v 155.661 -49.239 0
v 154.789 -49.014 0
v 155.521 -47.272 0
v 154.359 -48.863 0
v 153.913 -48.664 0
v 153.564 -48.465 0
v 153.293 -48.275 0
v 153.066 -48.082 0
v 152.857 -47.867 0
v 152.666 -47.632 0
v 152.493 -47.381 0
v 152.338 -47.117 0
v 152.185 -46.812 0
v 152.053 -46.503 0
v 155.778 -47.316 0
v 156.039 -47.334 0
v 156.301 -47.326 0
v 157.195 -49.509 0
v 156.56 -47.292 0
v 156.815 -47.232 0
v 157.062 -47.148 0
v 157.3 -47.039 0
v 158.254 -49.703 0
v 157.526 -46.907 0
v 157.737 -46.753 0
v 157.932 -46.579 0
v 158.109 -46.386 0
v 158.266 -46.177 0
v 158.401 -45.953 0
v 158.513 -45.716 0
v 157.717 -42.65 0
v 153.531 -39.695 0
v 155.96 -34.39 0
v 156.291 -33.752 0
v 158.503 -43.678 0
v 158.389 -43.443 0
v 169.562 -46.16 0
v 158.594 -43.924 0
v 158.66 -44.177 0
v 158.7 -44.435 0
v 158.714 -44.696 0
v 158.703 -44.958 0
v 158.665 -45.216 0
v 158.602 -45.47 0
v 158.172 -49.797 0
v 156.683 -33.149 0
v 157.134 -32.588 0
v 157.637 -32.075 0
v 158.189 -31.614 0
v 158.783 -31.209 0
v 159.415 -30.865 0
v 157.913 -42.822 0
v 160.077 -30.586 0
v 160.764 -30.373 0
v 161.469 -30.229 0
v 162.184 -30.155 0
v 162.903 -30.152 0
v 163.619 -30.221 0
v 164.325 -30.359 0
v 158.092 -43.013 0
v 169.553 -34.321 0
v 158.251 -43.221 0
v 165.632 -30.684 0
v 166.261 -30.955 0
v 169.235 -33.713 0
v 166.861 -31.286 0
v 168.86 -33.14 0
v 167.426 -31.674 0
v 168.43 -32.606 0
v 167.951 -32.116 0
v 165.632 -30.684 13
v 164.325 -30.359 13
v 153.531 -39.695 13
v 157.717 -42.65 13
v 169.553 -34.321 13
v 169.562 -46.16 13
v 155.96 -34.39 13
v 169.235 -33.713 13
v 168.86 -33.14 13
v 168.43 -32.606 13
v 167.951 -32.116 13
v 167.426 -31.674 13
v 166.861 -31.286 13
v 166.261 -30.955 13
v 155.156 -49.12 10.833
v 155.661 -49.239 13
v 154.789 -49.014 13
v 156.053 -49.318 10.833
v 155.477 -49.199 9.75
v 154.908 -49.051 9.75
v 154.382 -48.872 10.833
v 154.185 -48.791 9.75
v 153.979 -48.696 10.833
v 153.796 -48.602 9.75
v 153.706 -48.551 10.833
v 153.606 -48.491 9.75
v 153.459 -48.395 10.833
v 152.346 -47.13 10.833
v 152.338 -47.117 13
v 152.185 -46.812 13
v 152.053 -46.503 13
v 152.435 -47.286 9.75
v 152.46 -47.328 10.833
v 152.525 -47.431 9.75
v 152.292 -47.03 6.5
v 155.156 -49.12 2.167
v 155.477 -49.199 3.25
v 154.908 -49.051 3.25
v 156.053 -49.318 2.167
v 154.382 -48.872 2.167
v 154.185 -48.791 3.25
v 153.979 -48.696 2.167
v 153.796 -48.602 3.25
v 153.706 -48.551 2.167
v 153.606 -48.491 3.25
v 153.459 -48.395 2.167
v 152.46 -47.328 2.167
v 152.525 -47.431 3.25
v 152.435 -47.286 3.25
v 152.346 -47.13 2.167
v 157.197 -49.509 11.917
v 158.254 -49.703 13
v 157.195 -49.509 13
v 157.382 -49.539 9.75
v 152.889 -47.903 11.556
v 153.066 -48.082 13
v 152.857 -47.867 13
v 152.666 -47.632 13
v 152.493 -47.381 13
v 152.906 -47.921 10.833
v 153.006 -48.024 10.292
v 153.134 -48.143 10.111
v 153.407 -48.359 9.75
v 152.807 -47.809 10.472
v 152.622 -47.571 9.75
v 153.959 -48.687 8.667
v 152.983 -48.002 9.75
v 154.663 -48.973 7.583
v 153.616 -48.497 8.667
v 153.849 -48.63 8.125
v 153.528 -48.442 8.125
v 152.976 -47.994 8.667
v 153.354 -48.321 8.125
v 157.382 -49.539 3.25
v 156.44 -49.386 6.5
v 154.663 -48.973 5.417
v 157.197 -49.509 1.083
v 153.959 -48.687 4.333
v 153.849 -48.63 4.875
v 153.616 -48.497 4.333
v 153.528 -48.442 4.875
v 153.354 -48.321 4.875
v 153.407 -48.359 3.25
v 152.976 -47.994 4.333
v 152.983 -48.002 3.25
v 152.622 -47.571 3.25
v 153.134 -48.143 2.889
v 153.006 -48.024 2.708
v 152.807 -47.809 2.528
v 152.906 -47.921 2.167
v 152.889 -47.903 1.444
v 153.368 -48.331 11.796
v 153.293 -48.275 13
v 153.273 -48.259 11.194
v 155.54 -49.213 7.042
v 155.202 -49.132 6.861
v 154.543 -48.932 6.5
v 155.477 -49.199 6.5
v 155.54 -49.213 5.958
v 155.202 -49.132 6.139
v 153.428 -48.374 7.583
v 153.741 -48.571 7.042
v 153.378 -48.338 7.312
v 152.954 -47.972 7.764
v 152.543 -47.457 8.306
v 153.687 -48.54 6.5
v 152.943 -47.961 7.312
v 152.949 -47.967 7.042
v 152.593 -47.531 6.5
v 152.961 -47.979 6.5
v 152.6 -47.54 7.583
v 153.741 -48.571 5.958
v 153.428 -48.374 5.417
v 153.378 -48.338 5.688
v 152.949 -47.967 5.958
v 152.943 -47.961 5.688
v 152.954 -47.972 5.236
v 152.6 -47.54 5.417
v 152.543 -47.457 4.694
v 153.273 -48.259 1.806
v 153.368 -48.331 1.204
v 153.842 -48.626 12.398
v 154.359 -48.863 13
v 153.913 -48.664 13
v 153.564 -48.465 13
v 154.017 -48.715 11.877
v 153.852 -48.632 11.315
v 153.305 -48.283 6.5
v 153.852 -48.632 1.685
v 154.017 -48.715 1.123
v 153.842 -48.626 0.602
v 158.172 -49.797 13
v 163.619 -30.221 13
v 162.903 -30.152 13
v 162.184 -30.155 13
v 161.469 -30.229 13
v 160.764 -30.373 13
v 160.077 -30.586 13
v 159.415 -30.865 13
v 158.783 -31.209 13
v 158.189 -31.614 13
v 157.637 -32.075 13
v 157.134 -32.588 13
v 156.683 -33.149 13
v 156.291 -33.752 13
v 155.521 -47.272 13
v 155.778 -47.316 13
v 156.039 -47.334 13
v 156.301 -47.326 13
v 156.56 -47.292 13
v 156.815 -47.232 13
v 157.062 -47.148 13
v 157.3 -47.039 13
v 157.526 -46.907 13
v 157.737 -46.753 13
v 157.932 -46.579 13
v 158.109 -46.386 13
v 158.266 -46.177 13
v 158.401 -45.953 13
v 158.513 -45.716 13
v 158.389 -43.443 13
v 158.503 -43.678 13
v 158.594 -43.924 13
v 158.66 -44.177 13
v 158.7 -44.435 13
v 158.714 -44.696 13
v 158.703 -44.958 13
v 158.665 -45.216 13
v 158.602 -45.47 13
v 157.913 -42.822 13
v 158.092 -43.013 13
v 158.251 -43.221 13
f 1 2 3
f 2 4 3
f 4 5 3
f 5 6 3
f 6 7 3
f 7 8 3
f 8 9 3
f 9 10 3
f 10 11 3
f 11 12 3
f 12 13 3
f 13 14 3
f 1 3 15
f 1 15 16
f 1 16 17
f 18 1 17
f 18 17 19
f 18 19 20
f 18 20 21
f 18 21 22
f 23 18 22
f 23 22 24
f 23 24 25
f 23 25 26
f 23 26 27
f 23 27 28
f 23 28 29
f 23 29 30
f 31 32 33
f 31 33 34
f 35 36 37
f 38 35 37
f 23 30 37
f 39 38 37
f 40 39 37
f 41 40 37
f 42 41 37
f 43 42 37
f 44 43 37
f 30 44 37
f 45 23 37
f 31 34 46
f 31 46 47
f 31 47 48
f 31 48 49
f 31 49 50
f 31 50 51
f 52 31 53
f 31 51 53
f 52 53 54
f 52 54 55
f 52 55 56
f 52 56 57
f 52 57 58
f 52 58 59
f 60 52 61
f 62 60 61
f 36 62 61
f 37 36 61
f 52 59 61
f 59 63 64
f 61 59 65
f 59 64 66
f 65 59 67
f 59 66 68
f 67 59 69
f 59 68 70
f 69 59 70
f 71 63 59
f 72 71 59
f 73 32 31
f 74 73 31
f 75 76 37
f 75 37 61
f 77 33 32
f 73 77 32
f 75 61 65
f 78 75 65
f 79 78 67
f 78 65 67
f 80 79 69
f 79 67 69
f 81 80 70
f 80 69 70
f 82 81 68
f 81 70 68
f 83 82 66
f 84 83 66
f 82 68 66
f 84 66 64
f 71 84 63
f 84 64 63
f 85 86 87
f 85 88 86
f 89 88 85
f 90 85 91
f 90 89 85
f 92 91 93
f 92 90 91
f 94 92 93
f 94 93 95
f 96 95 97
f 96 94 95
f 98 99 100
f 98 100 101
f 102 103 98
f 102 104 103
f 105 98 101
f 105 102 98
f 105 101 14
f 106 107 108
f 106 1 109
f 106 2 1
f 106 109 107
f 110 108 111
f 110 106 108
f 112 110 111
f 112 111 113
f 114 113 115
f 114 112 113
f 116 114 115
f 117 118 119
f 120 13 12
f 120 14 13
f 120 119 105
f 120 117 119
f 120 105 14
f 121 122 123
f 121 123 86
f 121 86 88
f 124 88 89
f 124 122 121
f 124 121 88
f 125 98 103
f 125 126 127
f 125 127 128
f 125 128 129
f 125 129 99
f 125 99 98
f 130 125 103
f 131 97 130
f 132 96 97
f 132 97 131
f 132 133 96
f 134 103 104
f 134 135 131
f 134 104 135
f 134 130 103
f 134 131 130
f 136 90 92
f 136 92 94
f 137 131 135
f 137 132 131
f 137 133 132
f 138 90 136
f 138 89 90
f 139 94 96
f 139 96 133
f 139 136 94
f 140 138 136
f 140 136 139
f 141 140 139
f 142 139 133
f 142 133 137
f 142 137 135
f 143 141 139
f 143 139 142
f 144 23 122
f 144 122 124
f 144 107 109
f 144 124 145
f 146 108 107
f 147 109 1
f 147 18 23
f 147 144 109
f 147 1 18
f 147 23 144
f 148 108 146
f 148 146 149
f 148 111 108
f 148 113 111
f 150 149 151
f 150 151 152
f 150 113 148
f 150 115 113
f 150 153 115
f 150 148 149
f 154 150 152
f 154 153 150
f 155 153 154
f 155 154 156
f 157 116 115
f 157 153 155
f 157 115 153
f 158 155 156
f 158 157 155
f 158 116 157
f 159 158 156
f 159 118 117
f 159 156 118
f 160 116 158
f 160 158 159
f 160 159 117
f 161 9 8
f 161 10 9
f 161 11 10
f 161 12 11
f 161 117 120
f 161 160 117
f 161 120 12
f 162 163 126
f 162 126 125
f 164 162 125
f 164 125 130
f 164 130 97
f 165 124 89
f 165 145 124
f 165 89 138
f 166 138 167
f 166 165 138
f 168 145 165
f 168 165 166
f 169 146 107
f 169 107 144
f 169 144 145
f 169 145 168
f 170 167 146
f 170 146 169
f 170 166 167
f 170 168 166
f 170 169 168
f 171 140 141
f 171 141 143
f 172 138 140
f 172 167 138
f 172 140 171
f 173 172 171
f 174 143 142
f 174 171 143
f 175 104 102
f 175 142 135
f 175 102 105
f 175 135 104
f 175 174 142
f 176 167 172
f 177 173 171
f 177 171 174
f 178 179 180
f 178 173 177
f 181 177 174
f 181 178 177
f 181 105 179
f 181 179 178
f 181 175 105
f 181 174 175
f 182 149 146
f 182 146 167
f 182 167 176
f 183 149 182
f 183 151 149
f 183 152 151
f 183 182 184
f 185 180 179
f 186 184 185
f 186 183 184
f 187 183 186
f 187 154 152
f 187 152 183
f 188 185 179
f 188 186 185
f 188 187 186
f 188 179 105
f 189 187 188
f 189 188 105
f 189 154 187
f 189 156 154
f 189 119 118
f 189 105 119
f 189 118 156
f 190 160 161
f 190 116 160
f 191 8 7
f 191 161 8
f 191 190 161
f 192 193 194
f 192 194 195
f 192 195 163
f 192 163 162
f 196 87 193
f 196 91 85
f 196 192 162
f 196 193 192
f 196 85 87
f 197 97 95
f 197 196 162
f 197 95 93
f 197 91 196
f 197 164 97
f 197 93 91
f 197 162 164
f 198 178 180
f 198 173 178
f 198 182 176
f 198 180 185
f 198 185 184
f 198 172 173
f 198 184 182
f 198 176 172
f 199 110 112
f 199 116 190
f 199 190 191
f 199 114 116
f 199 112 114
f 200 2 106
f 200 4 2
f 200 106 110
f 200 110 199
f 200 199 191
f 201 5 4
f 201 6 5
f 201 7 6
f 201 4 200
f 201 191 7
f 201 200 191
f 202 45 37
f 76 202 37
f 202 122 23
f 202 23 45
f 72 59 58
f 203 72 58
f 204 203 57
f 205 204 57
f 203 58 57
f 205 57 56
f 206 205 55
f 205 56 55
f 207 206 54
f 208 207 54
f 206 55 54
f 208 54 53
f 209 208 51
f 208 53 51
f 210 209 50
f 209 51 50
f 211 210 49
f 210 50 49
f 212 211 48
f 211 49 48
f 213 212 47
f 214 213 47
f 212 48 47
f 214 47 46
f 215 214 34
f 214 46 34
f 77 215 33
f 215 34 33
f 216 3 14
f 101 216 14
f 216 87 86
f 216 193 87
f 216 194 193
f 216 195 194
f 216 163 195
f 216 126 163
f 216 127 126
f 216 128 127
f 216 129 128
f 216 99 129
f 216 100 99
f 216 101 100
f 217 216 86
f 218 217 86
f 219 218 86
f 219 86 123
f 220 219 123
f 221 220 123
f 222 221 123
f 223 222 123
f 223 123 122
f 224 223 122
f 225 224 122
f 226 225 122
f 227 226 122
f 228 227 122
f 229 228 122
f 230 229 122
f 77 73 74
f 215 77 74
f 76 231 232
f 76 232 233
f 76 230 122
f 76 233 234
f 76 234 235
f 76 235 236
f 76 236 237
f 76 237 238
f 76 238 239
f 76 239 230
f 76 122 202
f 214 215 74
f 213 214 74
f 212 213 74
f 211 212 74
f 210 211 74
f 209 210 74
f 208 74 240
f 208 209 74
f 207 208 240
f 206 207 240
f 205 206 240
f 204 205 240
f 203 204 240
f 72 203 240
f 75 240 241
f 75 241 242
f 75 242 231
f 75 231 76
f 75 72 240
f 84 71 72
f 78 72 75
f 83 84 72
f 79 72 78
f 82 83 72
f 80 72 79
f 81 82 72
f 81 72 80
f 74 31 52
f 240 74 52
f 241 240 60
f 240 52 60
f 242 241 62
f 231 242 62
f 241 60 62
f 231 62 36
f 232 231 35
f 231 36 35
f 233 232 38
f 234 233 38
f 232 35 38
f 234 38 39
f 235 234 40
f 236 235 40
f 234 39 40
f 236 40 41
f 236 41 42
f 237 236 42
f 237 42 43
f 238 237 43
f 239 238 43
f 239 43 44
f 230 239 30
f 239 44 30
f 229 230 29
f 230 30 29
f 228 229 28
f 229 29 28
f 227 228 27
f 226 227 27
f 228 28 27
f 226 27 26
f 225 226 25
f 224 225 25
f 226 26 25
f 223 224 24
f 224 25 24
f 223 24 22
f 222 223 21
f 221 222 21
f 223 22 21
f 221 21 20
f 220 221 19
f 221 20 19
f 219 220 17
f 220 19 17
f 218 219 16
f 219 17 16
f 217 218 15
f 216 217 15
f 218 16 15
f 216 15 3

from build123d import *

# Parameters (mm, degrees)
BOSS_EXTRUDE1_DEPTH = 13


with BuildPart() as part:
    # Sketch1 → Boss-Extrude1 (new body)
    with BuildSketch(Plane.XY):
        with BuildLine():
            Line((169.562304459, -46.160309931), (169.552568547, -34.320764913))
            ThreePointArc((169.552568547, -34.320764913), (167.950993273, -32.115534783), (165.631816979, -30.683925688))
            Line((165.631816979, -30.683925688), (164.32472896, -30.359173472))
            ThreePointArc((164.32472896, -30.359173472), (159.414987624, -30.865423823), (155.959571946, -34.389902778))
            Line((155.959571946, -34.389902778), (153.531390597, -39.695181294))
            Line((153.531390597, -39.695181294), (157.716593531, -42.649808935))
            ThreePointArc((157.716593531, -42.649808935), (158.460324124, -45.836019732), (155.520515025, -47.27219413))
            Line((155.520515025, -47.27219413), (152.052832095, -46.502518371))
            add(Edge.make_bspline(
                [(158.254307893, -49.702990605), (156.613856565, -49.334233495), (153.519768391, -49.291899755), (152.26174626, -47.033082798), (152.052832095, -46.502518371)],
                knots=[0, 0, 0, 0, 0.763192253, 1, 1, 1, 1], degree=3))
            Line((158.254307893, -49.702990605), (158.172150747, -49.796885596))
            Line((158.172150747, -49.796885596), (169.562304459, -46.160309931))
        make_face()
    extrude(amount=BOSS_EXTRUDE1_DEPTH)


solid = part.part
